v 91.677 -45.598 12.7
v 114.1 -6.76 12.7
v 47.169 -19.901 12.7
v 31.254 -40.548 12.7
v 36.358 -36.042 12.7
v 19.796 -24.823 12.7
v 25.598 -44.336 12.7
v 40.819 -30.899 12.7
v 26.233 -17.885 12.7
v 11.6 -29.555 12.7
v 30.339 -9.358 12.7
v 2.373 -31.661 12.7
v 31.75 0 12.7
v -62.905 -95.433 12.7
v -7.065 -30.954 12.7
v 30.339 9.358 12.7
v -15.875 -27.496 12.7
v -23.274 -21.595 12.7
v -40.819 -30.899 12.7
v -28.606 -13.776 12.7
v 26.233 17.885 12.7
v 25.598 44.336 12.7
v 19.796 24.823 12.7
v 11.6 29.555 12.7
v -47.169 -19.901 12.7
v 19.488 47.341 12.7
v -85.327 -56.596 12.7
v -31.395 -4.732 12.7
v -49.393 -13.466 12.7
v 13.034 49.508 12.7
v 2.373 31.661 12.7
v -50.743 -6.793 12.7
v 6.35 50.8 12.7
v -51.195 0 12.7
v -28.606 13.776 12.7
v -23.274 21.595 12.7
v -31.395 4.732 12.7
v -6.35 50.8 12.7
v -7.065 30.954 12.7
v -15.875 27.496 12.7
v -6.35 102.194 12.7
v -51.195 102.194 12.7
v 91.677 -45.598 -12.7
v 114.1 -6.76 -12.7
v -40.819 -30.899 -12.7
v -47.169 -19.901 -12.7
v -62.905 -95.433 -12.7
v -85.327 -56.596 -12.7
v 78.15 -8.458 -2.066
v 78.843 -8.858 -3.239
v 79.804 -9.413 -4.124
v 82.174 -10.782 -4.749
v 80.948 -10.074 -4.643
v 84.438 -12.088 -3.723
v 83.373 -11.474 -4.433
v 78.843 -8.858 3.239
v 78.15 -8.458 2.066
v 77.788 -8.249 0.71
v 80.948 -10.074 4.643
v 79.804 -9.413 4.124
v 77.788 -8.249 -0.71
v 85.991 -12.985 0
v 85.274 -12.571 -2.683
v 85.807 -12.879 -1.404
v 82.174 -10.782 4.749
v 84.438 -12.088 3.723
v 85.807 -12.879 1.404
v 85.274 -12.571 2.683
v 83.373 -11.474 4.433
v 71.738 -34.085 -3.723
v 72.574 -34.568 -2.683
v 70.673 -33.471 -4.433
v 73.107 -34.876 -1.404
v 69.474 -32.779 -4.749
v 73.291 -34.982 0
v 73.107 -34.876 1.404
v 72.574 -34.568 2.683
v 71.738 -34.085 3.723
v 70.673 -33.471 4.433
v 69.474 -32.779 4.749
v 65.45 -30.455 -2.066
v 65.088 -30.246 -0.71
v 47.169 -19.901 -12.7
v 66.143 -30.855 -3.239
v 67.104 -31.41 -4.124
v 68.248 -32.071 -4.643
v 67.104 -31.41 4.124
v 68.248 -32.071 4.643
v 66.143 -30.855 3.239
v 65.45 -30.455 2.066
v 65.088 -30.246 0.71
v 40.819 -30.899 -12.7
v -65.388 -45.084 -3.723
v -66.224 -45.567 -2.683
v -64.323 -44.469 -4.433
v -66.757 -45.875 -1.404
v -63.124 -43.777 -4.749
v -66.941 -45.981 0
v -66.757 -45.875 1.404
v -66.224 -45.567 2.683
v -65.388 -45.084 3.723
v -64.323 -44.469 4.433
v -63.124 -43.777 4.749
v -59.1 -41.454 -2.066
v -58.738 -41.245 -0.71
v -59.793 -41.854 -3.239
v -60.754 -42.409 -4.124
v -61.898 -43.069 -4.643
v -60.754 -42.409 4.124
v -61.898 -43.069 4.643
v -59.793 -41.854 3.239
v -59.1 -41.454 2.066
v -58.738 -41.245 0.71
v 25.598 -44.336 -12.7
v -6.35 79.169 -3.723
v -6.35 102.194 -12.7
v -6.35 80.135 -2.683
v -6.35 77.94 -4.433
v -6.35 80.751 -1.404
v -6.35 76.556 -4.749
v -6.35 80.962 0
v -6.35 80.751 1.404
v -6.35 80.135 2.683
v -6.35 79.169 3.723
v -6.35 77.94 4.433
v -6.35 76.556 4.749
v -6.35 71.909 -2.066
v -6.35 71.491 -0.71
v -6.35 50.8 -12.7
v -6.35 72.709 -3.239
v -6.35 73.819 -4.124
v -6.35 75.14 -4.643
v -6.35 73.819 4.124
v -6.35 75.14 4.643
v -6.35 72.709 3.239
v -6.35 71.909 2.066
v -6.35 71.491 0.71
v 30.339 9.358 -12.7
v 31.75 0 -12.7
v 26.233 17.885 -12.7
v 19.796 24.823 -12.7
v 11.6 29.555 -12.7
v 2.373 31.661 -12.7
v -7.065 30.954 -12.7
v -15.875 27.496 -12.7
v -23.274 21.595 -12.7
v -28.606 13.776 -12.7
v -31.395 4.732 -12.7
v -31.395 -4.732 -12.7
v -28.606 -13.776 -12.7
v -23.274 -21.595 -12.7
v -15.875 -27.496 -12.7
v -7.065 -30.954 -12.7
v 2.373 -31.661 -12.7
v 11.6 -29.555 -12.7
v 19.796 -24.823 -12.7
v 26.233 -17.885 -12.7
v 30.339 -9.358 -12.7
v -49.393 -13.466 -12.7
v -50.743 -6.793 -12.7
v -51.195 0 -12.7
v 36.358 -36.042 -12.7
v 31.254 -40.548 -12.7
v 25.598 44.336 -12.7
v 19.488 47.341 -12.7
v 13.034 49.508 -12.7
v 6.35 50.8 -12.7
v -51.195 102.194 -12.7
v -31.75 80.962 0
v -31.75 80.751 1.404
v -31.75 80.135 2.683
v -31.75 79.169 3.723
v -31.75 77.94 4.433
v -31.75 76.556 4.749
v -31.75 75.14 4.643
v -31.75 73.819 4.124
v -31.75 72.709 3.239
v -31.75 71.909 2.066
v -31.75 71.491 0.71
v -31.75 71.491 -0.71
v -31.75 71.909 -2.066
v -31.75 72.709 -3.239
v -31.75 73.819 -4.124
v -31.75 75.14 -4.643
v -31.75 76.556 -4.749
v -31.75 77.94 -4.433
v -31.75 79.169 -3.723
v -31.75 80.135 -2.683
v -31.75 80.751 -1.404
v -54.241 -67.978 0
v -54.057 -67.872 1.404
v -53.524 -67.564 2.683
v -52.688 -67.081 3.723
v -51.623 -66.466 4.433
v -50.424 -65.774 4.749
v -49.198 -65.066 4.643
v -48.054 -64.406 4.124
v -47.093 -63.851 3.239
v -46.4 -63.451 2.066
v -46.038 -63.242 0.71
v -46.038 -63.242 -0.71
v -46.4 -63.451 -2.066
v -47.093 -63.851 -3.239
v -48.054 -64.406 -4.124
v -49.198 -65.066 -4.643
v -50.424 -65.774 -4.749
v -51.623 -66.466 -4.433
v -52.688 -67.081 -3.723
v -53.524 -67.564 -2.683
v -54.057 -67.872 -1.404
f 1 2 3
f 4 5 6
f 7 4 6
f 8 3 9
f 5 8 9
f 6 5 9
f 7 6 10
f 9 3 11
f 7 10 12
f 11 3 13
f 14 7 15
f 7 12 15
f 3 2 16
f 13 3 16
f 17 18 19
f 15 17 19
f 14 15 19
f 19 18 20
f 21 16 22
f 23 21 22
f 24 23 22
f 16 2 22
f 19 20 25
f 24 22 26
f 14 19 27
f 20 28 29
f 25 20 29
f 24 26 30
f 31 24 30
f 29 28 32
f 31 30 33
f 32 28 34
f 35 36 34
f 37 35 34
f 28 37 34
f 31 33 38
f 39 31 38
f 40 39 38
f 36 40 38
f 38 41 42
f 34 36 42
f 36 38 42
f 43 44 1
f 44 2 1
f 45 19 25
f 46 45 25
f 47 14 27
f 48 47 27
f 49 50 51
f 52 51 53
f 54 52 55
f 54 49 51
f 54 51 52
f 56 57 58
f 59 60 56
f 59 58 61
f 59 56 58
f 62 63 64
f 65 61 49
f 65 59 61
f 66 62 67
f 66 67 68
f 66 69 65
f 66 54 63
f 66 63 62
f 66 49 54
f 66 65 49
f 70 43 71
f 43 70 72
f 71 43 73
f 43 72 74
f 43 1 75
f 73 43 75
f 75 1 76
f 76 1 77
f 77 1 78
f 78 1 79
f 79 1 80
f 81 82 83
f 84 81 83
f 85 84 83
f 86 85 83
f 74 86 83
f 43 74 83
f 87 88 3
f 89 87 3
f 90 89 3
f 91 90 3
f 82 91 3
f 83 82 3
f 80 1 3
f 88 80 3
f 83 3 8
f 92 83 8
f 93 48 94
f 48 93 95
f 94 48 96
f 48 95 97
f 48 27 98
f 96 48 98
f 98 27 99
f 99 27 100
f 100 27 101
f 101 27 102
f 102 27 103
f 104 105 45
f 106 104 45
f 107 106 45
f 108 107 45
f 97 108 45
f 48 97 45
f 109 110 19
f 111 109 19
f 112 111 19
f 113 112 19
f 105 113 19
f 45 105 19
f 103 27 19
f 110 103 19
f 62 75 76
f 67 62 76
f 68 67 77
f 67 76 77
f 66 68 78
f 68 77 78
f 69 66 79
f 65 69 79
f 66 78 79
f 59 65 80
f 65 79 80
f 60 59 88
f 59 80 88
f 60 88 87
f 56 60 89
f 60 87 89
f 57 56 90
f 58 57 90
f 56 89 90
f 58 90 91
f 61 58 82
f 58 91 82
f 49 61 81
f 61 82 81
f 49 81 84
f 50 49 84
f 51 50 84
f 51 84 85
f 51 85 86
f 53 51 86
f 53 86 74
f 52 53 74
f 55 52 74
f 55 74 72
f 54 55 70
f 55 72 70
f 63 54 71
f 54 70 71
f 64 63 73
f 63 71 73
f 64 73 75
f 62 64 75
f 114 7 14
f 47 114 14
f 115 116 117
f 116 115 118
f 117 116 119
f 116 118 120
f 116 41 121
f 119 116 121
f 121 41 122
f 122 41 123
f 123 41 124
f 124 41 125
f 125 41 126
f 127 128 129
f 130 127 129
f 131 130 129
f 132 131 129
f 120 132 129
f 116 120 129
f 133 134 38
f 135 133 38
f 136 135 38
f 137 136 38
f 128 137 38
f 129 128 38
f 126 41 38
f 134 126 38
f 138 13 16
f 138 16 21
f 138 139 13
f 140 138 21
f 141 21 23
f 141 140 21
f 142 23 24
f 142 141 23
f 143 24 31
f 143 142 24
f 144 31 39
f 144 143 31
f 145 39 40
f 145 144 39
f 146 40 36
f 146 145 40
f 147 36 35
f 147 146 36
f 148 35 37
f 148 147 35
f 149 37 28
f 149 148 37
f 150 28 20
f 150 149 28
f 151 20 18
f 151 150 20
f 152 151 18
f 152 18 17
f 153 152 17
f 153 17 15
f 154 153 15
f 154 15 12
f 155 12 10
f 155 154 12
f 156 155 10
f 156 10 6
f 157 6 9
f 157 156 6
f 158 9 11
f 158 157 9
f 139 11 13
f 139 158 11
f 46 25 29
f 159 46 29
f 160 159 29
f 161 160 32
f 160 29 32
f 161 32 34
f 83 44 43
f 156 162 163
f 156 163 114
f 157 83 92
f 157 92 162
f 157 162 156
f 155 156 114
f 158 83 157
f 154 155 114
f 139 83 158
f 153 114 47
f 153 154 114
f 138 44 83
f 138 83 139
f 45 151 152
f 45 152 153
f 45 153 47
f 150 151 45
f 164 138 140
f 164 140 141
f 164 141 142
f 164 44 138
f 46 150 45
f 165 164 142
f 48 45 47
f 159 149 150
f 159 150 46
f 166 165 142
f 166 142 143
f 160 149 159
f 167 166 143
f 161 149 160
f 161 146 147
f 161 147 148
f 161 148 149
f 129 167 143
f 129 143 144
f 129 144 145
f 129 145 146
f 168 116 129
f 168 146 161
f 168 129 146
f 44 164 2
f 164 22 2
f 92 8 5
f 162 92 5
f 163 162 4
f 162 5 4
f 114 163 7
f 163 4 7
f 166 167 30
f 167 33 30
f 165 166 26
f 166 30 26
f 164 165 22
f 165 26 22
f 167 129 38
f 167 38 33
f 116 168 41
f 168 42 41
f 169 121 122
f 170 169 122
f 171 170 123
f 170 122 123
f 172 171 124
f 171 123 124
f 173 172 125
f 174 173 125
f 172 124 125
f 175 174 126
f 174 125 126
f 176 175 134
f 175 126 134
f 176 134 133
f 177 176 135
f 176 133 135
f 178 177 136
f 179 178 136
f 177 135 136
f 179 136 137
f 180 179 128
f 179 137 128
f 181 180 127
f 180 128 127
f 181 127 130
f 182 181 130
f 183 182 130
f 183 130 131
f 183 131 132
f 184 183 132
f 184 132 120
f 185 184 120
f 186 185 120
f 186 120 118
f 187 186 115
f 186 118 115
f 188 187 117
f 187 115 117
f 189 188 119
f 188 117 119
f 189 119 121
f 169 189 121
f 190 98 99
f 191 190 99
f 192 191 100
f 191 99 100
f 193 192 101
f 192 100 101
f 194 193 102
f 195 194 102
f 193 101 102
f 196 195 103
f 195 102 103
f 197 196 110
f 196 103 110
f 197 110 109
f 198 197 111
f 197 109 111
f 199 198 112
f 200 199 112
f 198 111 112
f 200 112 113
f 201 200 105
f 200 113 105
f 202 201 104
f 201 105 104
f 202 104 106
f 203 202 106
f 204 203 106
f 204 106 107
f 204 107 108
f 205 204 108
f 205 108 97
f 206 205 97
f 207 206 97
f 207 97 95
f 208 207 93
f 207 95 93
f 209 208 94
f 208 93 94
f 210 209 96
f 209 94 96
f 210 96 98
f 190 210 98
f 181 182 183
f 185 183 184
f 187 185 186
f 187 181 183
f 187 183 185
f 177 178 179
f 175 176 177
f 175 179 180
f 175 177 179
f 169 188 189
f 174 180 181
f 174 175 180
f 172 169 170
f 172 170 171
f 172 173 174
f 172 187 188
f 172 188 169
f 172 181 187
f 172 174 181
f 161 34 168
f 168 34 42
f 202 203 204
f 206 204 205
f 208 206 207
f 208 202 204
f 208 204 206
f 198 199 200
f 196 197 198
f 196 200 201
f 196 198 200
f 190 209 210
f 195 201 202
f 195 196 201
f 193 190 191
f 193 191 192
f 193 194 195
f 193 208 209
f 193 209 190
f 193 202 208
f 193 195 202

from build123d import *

# Parameters (mm, degrees)
SKETCH1_R           = 31.75
BOSS_EXTRUDE1_DEPTH = 12.7
SKETCH2_R           = 4.7625
CUT_EXTRUDE1_DEPTH  = 25.4
CIRPATTERN1_COUNT   = 3


with BuildPart() as part:
    # Sketch1 → Boss-Extrude1 (new, symmetric)
    with BuildSketch(Plane.XY):
        with BuildLine():
            Line((-51.195336702, 0), (-51.195336702, 102.193578565))
            Line((-51.195336702, 102.193578565), (-6.35, 102.193578565))
            Line((-6.35, 102.193578565), (-6.35, 50.8))
            Line((-6.35, 50.8), (6.35, 50.8))
            ThreePointArc((6.35, 50.8), (16.297475531, 48.531997603), (25.597668351, 44.336462139))
            Line((25.597668351, 44.336462139), (114.099903492, -6.760327144))
            Line((114.099903492, -6.760327144), (91.677235141, -45.597527969))
            Line((91.677235141, -45.597527969), (47.169090512, -19.900738686))
            Line((47.169090512, -19.900738686), (40.819090512, -30.899261314))
            ThreePointArc((40.819090512, -30.899261314), (33.881205055, -38.380026629), (25.597668351, -44.336462139))
            Line((25.597668351, -44.336462139), (-62.90456679, -95.433251422))
            Line((-62.90456679, -95.433251422), (-85.327235141, -56.596050597))
            Line((-85.327235141, -56.596050597), (-40.819090512, -30.899261314))
            Line((-40.819090512, -30.899261314), (-47.169090512, -19.900738686))
            ThreePointArc((-47.169090512, -19.900738686), (-50.178680586, -10.151970974), (-51.195336702, 0))
        make_face()
        Circle(SKETCH1_R, mode=Mode.SUBTRACT)
    extrude(amount=BOSS_EXTRUDE1_DEPTH, both=True)

    # Sketch2 → Cut-Extrude1 (cut)
    with BuildSketch(Plane(origin=(-6.35, 0, 0), x_dir=(0, 0, -1), z_dir=(1, 0, 0))):
        with Locations(Location((0, 76.2, 0), (0, 0, 90))):
            Circle(SKETCH2_R)
    cut_extrude1 = extrude(amount=-CUT_EXTRUDE1_DEPTH, mode=Mode.SUBTRACT)

    # CirPattern1: Cut-Extrude1 ×3 about axis
    cirpattern1_axis = Axis((0, 0, 0), (0, 0, 1))
    for i in range(1, CIRPATTERN1_COUNT):
        add(cut_extrude1.rotate(cirpattern1_axis, i * 360 / CIRPATTERN1_COUNT), mode=Mode.SUBTRACT)


solid = part.part
